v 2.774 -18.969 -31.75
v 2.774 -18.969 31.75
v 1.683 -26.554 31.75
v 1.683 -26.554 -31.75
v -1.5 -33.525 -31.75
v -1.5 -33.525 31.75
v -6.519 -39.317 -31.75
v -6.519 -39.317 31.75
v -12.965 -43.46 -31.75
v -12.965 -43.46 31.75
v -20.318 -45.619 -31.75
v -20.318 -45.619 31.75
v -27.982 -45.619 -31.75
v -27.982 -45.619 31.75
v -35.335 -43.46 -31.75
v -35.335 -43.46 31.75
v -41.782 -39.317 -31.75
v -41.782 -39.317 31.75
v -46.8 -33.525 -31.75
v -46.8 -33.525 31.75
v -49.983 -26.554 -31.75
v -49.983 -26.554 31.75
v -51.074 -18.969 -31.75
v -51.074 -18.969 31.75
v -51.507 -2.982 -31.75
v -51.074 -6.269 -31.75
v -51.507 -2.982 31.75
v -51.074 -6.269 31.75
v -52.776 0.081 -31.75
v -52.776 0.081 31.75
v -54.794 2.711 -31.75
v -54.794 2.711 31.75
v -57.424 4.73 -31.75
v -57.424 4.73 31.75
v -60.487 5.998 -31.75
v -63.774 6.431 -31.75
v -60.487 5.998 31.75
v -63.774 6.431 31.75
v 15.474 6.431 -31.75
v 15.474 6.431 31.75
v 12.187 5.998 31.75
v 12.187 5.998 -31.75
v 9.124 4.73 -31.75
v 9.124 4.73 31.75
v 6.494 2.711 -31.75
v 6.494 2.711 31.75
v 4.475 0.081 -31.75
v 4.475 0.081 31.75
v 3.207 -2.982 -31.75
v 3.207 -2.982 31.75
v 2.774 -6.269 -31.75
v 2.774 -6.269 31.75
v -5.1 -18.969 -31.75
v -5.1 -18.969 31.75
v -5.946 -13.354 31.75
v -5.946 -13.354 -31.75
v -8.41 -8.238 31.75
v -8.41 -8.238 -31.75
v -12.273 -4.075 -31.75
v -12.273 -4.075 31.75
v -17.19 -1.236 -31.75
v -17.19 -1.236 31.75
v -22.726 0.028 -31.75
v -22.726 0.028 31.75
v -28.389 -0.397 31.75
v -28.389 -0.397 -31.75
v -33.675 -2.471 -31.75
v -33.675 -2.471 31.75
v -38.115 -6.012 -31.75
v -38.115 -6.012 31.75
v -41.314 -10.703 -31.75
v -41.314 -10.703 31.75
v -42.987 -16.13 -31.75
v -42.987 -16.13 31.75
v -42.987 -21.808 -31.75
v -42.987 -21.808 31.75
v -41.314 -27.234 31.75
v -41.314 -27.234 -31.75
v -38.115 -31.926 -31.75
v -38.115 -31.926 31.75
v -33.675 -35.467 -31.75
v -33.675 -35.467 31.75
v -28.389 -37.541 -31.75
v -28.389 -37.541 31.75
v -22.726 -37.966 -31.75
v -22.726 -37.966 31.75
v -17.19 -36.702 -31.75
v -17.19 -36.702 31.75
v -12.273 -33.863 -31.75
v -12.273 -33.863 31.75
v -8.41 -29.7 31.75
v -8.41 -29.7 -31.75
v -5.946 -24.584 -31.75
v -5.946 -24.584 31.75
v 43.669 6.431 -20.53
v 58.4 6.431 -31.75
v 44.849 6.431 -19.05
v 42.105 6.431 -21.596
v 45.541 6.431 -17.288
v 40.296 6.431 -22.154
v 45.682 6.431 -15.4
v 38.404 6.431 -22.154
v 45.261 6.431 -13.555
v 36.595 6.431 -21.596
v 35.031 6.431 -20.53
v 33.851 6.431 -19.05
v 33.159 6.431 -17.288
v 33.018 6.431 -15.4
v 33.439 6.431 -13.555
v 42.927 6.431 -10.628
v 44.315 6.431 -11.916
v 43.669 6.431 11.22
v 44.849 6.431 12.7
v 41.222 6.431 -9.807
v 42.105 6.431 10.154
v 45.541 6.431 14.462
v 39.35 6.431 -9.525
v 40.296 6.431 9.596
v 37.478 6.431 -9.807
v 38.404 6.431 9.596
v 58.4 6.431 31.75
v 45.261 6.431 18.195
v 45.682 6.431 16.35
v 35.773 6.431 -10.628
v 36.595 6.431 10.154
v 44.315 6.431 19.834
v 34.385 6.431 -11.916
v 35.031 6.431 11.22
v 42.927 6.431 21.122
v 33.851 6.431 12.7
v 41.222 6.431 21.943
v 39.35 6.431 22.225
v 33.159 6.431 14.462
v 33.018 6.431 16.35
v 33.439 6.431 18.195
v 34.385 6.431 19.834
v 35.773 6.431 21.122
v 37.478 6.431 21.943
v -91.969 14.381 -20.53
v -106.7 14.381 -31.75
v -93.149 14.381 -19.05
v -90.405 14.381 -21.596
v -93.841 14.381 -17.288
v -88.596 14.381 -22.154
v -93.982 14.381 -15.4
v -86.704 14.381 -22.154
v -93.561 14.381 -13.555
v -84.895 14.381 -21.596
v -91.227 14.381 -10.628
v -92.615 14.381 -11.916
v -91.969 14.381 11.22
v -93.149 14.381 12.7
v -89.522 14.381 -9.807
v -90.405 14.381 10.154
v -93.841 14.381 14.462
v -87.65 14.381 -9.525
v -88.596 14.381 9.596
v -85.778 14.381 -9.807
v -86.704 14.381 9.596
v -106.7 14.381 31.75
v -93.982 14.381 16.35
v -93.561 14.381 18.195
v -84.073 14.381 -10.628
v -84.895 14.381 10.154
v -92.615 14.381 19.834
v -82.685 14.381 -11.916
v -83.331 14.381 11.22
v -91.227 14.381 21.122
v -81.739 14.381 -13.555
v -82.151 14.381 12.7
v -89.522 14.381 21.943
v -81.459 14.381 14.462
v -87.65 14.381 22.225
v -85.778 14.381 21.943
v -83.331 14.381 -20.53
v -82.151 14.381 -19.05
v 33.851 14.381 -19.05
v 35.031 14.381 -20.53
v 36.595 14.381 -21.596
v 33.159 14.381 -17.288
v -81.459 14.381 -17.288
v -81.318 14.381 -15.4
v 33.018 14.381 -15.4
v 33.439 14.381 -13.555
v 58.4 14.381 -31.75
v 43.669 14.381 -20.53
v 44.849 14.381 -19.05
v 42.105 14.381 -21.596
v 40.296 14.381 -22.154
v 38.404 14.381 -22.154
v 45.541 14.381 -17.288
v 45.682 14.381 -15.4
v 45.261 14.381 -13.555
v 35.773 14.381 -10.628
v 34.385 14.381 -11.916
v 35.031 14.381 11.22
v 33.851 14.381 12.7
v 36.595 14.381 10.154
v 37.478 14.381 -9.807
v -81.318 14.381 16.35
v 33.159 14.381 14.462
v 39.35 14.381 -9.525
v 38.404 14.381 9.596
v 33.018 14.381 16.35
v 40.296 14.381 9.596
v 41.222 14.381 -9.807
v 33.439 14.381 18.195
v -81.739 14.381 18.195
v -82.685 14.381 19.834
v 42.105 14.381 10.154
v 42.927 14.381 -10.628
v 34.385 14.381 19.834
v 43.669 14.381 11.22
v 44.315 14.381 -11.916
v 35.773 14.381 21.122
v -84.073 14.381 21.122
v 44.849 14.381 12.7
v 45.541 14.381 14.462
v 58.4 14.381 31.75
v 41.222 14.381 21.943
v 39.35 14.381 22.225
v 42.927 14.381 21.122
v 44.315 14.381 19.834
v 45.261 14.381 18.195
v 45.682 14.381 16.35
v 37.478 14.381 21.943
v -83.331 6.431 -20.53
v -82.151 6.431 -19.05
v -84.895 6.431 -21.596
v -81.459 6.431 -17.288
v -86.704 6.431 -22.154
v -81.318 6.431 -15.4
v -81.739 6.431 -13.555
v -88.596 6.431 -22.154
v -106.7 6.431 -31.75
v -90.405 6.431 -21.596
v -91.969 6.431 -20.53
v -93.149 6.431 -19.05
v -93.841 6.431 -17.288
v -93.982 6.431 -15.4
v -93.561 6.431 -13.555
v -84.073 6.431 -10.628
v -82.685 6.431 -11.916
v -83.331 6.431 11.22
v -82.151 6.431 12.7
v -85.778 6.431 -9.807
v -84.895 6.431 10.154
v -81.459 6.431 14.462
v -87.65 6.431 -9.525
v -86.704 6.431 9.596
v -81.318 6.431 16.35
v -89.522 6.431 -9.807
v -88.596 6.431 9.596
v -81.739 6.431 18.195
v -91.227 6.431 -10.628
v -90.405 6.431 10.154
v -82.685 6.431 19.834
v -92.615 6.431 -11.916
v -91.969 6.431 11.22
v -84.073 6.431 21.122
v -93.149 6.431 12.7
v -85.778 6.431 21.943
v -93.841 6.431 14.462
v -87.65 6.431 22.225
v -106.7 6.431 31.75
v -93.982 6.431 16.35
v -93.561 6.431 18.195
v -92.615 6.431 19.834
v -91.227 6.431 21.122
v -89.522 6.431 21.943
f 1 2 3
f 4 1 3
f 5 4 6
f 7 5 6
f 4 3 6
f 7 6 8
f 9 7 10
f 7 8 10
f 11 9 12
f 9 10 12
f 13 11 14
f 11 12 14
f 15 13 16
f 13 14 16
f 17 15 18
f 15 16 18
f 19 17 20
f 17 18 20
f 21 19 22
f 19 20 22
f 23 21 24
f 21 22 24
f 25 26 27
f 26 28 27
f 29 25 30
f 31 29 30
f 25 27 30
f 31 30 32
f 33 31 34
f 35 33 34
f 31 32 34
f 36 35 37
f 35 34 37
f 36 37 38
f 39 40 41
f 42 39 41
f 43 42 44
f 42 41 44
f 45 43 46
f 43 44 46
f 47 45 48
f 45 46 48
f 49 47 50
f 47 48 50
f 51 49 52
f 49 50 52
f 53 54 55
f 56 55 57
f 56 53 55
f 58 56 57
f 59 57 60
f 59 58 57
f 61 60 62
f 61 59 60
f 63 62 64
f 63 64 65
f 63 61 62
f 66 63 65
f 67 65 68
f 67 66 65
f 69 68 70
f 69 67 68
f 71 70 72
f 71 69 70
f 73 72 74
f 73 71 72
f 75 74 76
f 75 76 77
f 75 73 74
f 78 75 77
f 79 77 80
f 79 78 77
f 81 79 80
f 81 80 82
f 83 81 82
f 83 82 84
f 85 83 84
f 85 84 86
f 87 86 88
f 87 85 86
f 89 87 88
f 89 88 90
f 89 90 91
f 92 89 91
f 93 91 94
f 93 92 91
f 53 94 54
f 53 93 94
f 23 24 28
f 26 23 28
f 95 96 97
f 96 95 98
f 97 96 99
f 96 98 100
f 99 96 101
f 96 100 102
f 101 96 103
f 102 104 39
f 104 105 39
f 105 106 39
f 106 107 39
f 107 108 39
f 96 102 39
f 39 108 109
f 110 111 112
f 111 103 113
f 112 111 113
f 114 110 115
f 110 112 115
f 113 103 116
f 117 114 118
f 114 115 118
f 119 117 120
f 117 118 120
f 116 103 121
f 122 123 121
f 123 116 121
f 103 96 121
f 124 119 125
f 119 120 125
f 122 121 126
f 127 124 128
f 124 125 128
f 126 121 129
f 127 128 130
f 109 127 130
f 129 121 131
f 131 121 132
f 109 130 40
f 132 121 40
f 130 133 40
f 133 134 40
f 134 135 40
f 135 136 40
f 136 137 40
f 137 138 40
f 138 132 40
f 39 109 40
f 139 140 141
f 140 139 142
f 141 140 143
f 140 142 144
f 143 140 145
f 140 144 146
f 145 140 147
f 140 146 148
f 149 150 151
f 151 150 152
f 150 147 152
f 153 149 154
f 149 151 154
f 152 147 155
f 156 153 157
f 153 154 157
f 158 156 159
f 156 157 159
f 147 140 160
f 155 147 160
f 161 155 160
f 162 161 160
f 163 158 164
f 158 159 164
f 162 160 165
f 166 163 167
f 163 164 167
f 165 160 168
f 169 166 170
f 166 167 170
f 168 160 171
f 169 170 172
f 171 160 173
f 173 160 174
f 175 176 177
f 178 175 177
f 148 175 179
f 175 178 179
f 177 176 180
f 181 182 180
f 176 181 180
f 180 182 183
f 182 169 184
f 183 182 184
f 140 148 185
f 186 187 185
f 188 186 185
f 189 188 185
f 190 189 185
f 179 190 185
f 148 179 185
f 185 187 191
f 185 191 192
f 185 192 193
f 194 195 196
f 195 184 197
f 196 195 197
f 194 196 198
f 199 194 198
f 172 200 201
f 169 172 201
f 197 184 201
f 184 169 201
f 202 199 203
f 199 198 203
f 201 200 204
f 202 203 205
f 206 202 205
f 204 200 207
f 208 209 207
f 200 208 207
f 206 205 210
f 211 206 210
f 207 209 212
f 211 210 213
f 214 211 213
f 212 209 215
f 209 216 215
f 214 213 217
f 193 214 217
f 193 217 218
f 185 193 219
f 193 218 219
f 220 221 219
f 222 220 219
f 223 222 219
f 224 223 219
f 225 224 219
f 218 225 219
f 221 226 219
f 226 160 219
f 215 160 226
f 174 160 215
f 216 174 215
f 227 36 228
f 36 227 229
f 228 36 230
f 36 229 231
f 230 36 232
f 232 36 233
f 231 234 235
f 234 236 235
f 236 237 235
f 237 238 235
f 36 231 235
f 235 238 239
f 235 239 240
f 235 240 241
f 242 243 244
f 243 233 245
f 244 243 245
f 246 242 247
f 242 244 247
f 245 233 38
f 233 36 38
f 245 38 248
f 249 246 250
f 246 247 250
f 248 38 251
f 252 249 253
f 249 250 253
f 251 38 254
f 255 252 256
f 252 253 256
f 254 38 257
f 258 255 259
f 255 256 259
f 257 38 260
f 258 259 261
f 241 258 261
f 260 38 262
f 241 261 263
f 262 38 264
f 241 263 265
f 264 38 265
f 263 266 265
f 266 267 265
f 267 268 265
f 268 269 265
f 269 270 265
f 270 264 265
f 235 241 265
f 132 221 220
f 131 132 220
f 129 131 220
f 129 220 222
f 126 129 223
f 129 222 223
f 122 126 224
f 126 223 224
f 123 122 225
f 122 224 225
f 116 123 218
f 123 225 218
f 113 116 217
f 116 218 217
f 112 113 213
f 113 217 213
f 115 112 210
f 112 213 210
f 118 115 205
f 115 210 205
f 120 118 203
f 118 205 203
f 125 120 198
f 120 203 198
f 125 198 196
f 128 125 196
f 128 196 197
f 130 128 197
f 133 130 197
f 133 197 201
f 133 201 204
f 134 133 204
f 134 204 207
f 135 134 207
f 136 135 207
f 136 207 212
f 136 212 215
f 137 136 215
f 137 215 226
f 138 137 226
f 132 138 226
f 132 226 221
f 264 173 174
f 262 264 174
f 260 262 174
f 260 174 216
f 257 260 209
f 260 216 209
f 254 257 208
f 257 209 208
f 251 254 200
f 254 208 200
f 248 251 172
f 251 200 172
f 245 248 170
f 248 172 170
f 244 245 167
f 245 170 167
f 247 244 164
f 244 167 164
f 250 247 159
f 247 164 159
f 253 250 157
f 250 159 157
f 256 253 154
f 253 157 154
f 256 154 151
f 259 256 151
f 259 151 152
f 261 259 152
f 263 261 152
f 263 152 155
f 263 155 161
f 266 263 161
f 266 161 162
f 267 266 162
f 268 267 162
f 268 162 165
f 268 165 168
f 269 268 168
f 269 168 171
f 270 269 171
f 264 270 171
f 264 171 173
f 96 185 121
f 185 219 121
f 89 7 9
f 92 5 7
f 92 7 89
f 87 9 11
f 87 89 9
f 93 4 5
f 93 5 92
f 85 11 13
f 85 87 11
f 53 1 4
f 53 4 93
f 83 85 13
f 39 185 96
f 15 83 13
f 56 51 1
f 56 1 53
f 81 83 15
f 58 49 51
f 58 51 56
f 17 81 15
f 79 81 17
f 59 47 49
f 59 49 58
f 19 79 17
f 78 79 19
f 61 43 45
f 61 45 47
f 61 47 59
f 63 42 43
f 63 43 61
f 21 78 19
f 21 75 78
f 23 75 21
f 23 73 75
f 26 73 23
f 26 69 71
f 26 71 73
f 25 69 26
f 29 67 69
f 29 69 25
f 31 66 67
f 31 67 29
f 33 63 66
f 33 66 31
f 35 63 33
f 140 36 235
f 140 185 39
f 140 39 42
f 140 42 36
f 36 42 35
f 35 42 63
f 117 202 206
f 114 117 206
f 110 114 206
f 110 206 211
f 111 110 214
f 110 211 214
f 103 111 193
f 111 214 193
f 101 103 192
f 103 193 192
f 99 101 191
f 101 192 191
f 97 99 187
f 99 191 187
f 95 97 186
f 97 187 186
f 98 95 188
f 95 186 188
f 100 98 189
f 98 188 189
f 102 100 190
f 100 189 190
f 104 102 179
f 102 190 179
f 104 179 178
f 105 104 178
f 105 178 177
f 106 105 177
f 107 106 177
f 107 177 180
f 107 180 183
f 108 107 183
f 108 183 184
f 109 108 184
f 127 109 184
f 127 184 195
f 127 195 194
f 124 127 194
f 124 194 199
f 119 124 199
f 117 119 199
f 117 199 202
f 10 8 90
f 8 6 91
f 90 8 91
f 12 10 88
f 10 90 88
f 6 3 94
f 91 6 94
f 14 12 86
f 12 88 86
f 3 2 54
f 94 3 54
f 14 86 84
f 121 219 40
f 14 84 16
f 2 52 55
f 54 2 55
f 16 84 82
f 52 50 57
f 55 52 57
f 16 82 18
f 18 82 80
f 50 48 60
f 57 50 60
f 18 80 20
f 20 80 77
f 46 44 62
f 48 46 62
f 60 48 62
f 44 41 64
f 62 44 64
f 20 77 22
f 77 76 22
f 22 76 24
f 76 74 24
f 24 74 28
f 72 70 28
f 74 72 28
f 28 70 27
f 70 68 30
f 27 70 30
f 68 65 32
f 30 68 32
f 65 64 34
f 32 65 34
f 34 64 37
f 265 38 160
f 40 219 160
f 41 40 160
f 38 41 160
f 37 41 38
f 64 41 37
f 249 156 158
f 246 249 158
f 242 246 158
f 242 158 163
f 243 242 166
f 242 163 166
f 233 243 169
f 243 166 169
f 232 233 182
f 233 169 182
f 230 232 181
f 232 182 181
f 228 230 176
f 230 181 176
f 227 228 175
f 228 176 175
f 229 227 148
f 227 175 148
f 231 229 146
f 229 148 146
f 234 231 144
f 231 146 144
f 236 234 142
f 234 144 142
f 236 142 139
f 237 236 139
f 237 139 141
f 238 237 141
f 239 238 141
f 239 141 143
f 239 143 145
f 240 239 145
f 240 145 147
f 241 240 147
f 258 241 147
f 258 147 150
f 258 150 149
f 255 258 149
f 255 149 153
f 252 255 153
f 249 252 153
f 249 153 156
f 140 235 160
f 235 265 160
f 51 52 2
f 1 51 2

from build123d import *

# Parameters (mm, degrees)
SKETCH1_R           = 19.05
BOSS_EXTRUDE1_DEPTH = 31.75
SKETCH3_R           = 6.35
CUT_EXTRUDE1_DEPTH  = 127.593613969


with BuildPart() as part:
    # Sketch1 → Boss-Extrude1 (new, symmetric)
    with BuildSketch(Plane.XY):
        with BuildLine():
            Line((-51.074053478, -18.968891898), (-51.074053478, -6.268891898))
            ThreePointArc((-51.074053478, -6.268891898), (-54.793797356, 2.711364223), (-63.774053478, 6.431108102))
            Line((-63.774053478, 6.431108102), (-106.700053478, 6.431108102))
            Line((-106.700053478, 6.431108102), (-106.700053478, 14.381308102))
            Line((-106.700053478, 14.381308102), (58.399946522, 14.381308102))
            Line((58.399946522, 14.381308102), (58.399946522, 6.431108102))
            Line((58.399946522, 6.431108102), (15.473946522, 6.431108102))
            ThreePointArc((15.473946522, 6.431108102), (6.493690401, 2.711364223), (2.773946522, -6.268891898))
            Line((2.773946522, -6.268891898), (2.773946522, -18.968891898))
            ThreePointArc((2.773946522, -18.968891898), (-24.150053478, -45.892891898), (-51.074053478, -18.968891898))
        make_face()
        with Locations((-24.150053478, -18.968891898)):
            Circle(SKETCH1_R, mode=Mode.SUBTRACT)
    extrude(amount=BOSS_EXTRUDE1_DEPTH, both=True)

    # Sketch3 → Cut-Extrude1 (cut, through all)
    with BuildSketch(Plane(origin=(0, 14.381308102, 0), x_dir=(1, 0, 0), z_dir=(0, 1, 0))):
        with Locations(Location((-87.650053478, 15.875, 0), (0, 0, 270))):
            Circle(SKETCH3_R)
        with Locations(Location((-87.650053478, -15.875, 0), (0, 0, 270))):
            Circle(SKETCH3_R)
        with Locations(Location((39.349946522, -15.875, 0), (0, 0, 270))):
            Circle(SKETCH3_R)
        with Locations(Location((39.349946522, 15.875, 0), (0, 0, 270))):
            Circle(SKETCH3_R)
    extrude(amount=-CUT_EXTRUDE1_DEPTH, mode=Mode.SUBTRACT)


solid = part.part
